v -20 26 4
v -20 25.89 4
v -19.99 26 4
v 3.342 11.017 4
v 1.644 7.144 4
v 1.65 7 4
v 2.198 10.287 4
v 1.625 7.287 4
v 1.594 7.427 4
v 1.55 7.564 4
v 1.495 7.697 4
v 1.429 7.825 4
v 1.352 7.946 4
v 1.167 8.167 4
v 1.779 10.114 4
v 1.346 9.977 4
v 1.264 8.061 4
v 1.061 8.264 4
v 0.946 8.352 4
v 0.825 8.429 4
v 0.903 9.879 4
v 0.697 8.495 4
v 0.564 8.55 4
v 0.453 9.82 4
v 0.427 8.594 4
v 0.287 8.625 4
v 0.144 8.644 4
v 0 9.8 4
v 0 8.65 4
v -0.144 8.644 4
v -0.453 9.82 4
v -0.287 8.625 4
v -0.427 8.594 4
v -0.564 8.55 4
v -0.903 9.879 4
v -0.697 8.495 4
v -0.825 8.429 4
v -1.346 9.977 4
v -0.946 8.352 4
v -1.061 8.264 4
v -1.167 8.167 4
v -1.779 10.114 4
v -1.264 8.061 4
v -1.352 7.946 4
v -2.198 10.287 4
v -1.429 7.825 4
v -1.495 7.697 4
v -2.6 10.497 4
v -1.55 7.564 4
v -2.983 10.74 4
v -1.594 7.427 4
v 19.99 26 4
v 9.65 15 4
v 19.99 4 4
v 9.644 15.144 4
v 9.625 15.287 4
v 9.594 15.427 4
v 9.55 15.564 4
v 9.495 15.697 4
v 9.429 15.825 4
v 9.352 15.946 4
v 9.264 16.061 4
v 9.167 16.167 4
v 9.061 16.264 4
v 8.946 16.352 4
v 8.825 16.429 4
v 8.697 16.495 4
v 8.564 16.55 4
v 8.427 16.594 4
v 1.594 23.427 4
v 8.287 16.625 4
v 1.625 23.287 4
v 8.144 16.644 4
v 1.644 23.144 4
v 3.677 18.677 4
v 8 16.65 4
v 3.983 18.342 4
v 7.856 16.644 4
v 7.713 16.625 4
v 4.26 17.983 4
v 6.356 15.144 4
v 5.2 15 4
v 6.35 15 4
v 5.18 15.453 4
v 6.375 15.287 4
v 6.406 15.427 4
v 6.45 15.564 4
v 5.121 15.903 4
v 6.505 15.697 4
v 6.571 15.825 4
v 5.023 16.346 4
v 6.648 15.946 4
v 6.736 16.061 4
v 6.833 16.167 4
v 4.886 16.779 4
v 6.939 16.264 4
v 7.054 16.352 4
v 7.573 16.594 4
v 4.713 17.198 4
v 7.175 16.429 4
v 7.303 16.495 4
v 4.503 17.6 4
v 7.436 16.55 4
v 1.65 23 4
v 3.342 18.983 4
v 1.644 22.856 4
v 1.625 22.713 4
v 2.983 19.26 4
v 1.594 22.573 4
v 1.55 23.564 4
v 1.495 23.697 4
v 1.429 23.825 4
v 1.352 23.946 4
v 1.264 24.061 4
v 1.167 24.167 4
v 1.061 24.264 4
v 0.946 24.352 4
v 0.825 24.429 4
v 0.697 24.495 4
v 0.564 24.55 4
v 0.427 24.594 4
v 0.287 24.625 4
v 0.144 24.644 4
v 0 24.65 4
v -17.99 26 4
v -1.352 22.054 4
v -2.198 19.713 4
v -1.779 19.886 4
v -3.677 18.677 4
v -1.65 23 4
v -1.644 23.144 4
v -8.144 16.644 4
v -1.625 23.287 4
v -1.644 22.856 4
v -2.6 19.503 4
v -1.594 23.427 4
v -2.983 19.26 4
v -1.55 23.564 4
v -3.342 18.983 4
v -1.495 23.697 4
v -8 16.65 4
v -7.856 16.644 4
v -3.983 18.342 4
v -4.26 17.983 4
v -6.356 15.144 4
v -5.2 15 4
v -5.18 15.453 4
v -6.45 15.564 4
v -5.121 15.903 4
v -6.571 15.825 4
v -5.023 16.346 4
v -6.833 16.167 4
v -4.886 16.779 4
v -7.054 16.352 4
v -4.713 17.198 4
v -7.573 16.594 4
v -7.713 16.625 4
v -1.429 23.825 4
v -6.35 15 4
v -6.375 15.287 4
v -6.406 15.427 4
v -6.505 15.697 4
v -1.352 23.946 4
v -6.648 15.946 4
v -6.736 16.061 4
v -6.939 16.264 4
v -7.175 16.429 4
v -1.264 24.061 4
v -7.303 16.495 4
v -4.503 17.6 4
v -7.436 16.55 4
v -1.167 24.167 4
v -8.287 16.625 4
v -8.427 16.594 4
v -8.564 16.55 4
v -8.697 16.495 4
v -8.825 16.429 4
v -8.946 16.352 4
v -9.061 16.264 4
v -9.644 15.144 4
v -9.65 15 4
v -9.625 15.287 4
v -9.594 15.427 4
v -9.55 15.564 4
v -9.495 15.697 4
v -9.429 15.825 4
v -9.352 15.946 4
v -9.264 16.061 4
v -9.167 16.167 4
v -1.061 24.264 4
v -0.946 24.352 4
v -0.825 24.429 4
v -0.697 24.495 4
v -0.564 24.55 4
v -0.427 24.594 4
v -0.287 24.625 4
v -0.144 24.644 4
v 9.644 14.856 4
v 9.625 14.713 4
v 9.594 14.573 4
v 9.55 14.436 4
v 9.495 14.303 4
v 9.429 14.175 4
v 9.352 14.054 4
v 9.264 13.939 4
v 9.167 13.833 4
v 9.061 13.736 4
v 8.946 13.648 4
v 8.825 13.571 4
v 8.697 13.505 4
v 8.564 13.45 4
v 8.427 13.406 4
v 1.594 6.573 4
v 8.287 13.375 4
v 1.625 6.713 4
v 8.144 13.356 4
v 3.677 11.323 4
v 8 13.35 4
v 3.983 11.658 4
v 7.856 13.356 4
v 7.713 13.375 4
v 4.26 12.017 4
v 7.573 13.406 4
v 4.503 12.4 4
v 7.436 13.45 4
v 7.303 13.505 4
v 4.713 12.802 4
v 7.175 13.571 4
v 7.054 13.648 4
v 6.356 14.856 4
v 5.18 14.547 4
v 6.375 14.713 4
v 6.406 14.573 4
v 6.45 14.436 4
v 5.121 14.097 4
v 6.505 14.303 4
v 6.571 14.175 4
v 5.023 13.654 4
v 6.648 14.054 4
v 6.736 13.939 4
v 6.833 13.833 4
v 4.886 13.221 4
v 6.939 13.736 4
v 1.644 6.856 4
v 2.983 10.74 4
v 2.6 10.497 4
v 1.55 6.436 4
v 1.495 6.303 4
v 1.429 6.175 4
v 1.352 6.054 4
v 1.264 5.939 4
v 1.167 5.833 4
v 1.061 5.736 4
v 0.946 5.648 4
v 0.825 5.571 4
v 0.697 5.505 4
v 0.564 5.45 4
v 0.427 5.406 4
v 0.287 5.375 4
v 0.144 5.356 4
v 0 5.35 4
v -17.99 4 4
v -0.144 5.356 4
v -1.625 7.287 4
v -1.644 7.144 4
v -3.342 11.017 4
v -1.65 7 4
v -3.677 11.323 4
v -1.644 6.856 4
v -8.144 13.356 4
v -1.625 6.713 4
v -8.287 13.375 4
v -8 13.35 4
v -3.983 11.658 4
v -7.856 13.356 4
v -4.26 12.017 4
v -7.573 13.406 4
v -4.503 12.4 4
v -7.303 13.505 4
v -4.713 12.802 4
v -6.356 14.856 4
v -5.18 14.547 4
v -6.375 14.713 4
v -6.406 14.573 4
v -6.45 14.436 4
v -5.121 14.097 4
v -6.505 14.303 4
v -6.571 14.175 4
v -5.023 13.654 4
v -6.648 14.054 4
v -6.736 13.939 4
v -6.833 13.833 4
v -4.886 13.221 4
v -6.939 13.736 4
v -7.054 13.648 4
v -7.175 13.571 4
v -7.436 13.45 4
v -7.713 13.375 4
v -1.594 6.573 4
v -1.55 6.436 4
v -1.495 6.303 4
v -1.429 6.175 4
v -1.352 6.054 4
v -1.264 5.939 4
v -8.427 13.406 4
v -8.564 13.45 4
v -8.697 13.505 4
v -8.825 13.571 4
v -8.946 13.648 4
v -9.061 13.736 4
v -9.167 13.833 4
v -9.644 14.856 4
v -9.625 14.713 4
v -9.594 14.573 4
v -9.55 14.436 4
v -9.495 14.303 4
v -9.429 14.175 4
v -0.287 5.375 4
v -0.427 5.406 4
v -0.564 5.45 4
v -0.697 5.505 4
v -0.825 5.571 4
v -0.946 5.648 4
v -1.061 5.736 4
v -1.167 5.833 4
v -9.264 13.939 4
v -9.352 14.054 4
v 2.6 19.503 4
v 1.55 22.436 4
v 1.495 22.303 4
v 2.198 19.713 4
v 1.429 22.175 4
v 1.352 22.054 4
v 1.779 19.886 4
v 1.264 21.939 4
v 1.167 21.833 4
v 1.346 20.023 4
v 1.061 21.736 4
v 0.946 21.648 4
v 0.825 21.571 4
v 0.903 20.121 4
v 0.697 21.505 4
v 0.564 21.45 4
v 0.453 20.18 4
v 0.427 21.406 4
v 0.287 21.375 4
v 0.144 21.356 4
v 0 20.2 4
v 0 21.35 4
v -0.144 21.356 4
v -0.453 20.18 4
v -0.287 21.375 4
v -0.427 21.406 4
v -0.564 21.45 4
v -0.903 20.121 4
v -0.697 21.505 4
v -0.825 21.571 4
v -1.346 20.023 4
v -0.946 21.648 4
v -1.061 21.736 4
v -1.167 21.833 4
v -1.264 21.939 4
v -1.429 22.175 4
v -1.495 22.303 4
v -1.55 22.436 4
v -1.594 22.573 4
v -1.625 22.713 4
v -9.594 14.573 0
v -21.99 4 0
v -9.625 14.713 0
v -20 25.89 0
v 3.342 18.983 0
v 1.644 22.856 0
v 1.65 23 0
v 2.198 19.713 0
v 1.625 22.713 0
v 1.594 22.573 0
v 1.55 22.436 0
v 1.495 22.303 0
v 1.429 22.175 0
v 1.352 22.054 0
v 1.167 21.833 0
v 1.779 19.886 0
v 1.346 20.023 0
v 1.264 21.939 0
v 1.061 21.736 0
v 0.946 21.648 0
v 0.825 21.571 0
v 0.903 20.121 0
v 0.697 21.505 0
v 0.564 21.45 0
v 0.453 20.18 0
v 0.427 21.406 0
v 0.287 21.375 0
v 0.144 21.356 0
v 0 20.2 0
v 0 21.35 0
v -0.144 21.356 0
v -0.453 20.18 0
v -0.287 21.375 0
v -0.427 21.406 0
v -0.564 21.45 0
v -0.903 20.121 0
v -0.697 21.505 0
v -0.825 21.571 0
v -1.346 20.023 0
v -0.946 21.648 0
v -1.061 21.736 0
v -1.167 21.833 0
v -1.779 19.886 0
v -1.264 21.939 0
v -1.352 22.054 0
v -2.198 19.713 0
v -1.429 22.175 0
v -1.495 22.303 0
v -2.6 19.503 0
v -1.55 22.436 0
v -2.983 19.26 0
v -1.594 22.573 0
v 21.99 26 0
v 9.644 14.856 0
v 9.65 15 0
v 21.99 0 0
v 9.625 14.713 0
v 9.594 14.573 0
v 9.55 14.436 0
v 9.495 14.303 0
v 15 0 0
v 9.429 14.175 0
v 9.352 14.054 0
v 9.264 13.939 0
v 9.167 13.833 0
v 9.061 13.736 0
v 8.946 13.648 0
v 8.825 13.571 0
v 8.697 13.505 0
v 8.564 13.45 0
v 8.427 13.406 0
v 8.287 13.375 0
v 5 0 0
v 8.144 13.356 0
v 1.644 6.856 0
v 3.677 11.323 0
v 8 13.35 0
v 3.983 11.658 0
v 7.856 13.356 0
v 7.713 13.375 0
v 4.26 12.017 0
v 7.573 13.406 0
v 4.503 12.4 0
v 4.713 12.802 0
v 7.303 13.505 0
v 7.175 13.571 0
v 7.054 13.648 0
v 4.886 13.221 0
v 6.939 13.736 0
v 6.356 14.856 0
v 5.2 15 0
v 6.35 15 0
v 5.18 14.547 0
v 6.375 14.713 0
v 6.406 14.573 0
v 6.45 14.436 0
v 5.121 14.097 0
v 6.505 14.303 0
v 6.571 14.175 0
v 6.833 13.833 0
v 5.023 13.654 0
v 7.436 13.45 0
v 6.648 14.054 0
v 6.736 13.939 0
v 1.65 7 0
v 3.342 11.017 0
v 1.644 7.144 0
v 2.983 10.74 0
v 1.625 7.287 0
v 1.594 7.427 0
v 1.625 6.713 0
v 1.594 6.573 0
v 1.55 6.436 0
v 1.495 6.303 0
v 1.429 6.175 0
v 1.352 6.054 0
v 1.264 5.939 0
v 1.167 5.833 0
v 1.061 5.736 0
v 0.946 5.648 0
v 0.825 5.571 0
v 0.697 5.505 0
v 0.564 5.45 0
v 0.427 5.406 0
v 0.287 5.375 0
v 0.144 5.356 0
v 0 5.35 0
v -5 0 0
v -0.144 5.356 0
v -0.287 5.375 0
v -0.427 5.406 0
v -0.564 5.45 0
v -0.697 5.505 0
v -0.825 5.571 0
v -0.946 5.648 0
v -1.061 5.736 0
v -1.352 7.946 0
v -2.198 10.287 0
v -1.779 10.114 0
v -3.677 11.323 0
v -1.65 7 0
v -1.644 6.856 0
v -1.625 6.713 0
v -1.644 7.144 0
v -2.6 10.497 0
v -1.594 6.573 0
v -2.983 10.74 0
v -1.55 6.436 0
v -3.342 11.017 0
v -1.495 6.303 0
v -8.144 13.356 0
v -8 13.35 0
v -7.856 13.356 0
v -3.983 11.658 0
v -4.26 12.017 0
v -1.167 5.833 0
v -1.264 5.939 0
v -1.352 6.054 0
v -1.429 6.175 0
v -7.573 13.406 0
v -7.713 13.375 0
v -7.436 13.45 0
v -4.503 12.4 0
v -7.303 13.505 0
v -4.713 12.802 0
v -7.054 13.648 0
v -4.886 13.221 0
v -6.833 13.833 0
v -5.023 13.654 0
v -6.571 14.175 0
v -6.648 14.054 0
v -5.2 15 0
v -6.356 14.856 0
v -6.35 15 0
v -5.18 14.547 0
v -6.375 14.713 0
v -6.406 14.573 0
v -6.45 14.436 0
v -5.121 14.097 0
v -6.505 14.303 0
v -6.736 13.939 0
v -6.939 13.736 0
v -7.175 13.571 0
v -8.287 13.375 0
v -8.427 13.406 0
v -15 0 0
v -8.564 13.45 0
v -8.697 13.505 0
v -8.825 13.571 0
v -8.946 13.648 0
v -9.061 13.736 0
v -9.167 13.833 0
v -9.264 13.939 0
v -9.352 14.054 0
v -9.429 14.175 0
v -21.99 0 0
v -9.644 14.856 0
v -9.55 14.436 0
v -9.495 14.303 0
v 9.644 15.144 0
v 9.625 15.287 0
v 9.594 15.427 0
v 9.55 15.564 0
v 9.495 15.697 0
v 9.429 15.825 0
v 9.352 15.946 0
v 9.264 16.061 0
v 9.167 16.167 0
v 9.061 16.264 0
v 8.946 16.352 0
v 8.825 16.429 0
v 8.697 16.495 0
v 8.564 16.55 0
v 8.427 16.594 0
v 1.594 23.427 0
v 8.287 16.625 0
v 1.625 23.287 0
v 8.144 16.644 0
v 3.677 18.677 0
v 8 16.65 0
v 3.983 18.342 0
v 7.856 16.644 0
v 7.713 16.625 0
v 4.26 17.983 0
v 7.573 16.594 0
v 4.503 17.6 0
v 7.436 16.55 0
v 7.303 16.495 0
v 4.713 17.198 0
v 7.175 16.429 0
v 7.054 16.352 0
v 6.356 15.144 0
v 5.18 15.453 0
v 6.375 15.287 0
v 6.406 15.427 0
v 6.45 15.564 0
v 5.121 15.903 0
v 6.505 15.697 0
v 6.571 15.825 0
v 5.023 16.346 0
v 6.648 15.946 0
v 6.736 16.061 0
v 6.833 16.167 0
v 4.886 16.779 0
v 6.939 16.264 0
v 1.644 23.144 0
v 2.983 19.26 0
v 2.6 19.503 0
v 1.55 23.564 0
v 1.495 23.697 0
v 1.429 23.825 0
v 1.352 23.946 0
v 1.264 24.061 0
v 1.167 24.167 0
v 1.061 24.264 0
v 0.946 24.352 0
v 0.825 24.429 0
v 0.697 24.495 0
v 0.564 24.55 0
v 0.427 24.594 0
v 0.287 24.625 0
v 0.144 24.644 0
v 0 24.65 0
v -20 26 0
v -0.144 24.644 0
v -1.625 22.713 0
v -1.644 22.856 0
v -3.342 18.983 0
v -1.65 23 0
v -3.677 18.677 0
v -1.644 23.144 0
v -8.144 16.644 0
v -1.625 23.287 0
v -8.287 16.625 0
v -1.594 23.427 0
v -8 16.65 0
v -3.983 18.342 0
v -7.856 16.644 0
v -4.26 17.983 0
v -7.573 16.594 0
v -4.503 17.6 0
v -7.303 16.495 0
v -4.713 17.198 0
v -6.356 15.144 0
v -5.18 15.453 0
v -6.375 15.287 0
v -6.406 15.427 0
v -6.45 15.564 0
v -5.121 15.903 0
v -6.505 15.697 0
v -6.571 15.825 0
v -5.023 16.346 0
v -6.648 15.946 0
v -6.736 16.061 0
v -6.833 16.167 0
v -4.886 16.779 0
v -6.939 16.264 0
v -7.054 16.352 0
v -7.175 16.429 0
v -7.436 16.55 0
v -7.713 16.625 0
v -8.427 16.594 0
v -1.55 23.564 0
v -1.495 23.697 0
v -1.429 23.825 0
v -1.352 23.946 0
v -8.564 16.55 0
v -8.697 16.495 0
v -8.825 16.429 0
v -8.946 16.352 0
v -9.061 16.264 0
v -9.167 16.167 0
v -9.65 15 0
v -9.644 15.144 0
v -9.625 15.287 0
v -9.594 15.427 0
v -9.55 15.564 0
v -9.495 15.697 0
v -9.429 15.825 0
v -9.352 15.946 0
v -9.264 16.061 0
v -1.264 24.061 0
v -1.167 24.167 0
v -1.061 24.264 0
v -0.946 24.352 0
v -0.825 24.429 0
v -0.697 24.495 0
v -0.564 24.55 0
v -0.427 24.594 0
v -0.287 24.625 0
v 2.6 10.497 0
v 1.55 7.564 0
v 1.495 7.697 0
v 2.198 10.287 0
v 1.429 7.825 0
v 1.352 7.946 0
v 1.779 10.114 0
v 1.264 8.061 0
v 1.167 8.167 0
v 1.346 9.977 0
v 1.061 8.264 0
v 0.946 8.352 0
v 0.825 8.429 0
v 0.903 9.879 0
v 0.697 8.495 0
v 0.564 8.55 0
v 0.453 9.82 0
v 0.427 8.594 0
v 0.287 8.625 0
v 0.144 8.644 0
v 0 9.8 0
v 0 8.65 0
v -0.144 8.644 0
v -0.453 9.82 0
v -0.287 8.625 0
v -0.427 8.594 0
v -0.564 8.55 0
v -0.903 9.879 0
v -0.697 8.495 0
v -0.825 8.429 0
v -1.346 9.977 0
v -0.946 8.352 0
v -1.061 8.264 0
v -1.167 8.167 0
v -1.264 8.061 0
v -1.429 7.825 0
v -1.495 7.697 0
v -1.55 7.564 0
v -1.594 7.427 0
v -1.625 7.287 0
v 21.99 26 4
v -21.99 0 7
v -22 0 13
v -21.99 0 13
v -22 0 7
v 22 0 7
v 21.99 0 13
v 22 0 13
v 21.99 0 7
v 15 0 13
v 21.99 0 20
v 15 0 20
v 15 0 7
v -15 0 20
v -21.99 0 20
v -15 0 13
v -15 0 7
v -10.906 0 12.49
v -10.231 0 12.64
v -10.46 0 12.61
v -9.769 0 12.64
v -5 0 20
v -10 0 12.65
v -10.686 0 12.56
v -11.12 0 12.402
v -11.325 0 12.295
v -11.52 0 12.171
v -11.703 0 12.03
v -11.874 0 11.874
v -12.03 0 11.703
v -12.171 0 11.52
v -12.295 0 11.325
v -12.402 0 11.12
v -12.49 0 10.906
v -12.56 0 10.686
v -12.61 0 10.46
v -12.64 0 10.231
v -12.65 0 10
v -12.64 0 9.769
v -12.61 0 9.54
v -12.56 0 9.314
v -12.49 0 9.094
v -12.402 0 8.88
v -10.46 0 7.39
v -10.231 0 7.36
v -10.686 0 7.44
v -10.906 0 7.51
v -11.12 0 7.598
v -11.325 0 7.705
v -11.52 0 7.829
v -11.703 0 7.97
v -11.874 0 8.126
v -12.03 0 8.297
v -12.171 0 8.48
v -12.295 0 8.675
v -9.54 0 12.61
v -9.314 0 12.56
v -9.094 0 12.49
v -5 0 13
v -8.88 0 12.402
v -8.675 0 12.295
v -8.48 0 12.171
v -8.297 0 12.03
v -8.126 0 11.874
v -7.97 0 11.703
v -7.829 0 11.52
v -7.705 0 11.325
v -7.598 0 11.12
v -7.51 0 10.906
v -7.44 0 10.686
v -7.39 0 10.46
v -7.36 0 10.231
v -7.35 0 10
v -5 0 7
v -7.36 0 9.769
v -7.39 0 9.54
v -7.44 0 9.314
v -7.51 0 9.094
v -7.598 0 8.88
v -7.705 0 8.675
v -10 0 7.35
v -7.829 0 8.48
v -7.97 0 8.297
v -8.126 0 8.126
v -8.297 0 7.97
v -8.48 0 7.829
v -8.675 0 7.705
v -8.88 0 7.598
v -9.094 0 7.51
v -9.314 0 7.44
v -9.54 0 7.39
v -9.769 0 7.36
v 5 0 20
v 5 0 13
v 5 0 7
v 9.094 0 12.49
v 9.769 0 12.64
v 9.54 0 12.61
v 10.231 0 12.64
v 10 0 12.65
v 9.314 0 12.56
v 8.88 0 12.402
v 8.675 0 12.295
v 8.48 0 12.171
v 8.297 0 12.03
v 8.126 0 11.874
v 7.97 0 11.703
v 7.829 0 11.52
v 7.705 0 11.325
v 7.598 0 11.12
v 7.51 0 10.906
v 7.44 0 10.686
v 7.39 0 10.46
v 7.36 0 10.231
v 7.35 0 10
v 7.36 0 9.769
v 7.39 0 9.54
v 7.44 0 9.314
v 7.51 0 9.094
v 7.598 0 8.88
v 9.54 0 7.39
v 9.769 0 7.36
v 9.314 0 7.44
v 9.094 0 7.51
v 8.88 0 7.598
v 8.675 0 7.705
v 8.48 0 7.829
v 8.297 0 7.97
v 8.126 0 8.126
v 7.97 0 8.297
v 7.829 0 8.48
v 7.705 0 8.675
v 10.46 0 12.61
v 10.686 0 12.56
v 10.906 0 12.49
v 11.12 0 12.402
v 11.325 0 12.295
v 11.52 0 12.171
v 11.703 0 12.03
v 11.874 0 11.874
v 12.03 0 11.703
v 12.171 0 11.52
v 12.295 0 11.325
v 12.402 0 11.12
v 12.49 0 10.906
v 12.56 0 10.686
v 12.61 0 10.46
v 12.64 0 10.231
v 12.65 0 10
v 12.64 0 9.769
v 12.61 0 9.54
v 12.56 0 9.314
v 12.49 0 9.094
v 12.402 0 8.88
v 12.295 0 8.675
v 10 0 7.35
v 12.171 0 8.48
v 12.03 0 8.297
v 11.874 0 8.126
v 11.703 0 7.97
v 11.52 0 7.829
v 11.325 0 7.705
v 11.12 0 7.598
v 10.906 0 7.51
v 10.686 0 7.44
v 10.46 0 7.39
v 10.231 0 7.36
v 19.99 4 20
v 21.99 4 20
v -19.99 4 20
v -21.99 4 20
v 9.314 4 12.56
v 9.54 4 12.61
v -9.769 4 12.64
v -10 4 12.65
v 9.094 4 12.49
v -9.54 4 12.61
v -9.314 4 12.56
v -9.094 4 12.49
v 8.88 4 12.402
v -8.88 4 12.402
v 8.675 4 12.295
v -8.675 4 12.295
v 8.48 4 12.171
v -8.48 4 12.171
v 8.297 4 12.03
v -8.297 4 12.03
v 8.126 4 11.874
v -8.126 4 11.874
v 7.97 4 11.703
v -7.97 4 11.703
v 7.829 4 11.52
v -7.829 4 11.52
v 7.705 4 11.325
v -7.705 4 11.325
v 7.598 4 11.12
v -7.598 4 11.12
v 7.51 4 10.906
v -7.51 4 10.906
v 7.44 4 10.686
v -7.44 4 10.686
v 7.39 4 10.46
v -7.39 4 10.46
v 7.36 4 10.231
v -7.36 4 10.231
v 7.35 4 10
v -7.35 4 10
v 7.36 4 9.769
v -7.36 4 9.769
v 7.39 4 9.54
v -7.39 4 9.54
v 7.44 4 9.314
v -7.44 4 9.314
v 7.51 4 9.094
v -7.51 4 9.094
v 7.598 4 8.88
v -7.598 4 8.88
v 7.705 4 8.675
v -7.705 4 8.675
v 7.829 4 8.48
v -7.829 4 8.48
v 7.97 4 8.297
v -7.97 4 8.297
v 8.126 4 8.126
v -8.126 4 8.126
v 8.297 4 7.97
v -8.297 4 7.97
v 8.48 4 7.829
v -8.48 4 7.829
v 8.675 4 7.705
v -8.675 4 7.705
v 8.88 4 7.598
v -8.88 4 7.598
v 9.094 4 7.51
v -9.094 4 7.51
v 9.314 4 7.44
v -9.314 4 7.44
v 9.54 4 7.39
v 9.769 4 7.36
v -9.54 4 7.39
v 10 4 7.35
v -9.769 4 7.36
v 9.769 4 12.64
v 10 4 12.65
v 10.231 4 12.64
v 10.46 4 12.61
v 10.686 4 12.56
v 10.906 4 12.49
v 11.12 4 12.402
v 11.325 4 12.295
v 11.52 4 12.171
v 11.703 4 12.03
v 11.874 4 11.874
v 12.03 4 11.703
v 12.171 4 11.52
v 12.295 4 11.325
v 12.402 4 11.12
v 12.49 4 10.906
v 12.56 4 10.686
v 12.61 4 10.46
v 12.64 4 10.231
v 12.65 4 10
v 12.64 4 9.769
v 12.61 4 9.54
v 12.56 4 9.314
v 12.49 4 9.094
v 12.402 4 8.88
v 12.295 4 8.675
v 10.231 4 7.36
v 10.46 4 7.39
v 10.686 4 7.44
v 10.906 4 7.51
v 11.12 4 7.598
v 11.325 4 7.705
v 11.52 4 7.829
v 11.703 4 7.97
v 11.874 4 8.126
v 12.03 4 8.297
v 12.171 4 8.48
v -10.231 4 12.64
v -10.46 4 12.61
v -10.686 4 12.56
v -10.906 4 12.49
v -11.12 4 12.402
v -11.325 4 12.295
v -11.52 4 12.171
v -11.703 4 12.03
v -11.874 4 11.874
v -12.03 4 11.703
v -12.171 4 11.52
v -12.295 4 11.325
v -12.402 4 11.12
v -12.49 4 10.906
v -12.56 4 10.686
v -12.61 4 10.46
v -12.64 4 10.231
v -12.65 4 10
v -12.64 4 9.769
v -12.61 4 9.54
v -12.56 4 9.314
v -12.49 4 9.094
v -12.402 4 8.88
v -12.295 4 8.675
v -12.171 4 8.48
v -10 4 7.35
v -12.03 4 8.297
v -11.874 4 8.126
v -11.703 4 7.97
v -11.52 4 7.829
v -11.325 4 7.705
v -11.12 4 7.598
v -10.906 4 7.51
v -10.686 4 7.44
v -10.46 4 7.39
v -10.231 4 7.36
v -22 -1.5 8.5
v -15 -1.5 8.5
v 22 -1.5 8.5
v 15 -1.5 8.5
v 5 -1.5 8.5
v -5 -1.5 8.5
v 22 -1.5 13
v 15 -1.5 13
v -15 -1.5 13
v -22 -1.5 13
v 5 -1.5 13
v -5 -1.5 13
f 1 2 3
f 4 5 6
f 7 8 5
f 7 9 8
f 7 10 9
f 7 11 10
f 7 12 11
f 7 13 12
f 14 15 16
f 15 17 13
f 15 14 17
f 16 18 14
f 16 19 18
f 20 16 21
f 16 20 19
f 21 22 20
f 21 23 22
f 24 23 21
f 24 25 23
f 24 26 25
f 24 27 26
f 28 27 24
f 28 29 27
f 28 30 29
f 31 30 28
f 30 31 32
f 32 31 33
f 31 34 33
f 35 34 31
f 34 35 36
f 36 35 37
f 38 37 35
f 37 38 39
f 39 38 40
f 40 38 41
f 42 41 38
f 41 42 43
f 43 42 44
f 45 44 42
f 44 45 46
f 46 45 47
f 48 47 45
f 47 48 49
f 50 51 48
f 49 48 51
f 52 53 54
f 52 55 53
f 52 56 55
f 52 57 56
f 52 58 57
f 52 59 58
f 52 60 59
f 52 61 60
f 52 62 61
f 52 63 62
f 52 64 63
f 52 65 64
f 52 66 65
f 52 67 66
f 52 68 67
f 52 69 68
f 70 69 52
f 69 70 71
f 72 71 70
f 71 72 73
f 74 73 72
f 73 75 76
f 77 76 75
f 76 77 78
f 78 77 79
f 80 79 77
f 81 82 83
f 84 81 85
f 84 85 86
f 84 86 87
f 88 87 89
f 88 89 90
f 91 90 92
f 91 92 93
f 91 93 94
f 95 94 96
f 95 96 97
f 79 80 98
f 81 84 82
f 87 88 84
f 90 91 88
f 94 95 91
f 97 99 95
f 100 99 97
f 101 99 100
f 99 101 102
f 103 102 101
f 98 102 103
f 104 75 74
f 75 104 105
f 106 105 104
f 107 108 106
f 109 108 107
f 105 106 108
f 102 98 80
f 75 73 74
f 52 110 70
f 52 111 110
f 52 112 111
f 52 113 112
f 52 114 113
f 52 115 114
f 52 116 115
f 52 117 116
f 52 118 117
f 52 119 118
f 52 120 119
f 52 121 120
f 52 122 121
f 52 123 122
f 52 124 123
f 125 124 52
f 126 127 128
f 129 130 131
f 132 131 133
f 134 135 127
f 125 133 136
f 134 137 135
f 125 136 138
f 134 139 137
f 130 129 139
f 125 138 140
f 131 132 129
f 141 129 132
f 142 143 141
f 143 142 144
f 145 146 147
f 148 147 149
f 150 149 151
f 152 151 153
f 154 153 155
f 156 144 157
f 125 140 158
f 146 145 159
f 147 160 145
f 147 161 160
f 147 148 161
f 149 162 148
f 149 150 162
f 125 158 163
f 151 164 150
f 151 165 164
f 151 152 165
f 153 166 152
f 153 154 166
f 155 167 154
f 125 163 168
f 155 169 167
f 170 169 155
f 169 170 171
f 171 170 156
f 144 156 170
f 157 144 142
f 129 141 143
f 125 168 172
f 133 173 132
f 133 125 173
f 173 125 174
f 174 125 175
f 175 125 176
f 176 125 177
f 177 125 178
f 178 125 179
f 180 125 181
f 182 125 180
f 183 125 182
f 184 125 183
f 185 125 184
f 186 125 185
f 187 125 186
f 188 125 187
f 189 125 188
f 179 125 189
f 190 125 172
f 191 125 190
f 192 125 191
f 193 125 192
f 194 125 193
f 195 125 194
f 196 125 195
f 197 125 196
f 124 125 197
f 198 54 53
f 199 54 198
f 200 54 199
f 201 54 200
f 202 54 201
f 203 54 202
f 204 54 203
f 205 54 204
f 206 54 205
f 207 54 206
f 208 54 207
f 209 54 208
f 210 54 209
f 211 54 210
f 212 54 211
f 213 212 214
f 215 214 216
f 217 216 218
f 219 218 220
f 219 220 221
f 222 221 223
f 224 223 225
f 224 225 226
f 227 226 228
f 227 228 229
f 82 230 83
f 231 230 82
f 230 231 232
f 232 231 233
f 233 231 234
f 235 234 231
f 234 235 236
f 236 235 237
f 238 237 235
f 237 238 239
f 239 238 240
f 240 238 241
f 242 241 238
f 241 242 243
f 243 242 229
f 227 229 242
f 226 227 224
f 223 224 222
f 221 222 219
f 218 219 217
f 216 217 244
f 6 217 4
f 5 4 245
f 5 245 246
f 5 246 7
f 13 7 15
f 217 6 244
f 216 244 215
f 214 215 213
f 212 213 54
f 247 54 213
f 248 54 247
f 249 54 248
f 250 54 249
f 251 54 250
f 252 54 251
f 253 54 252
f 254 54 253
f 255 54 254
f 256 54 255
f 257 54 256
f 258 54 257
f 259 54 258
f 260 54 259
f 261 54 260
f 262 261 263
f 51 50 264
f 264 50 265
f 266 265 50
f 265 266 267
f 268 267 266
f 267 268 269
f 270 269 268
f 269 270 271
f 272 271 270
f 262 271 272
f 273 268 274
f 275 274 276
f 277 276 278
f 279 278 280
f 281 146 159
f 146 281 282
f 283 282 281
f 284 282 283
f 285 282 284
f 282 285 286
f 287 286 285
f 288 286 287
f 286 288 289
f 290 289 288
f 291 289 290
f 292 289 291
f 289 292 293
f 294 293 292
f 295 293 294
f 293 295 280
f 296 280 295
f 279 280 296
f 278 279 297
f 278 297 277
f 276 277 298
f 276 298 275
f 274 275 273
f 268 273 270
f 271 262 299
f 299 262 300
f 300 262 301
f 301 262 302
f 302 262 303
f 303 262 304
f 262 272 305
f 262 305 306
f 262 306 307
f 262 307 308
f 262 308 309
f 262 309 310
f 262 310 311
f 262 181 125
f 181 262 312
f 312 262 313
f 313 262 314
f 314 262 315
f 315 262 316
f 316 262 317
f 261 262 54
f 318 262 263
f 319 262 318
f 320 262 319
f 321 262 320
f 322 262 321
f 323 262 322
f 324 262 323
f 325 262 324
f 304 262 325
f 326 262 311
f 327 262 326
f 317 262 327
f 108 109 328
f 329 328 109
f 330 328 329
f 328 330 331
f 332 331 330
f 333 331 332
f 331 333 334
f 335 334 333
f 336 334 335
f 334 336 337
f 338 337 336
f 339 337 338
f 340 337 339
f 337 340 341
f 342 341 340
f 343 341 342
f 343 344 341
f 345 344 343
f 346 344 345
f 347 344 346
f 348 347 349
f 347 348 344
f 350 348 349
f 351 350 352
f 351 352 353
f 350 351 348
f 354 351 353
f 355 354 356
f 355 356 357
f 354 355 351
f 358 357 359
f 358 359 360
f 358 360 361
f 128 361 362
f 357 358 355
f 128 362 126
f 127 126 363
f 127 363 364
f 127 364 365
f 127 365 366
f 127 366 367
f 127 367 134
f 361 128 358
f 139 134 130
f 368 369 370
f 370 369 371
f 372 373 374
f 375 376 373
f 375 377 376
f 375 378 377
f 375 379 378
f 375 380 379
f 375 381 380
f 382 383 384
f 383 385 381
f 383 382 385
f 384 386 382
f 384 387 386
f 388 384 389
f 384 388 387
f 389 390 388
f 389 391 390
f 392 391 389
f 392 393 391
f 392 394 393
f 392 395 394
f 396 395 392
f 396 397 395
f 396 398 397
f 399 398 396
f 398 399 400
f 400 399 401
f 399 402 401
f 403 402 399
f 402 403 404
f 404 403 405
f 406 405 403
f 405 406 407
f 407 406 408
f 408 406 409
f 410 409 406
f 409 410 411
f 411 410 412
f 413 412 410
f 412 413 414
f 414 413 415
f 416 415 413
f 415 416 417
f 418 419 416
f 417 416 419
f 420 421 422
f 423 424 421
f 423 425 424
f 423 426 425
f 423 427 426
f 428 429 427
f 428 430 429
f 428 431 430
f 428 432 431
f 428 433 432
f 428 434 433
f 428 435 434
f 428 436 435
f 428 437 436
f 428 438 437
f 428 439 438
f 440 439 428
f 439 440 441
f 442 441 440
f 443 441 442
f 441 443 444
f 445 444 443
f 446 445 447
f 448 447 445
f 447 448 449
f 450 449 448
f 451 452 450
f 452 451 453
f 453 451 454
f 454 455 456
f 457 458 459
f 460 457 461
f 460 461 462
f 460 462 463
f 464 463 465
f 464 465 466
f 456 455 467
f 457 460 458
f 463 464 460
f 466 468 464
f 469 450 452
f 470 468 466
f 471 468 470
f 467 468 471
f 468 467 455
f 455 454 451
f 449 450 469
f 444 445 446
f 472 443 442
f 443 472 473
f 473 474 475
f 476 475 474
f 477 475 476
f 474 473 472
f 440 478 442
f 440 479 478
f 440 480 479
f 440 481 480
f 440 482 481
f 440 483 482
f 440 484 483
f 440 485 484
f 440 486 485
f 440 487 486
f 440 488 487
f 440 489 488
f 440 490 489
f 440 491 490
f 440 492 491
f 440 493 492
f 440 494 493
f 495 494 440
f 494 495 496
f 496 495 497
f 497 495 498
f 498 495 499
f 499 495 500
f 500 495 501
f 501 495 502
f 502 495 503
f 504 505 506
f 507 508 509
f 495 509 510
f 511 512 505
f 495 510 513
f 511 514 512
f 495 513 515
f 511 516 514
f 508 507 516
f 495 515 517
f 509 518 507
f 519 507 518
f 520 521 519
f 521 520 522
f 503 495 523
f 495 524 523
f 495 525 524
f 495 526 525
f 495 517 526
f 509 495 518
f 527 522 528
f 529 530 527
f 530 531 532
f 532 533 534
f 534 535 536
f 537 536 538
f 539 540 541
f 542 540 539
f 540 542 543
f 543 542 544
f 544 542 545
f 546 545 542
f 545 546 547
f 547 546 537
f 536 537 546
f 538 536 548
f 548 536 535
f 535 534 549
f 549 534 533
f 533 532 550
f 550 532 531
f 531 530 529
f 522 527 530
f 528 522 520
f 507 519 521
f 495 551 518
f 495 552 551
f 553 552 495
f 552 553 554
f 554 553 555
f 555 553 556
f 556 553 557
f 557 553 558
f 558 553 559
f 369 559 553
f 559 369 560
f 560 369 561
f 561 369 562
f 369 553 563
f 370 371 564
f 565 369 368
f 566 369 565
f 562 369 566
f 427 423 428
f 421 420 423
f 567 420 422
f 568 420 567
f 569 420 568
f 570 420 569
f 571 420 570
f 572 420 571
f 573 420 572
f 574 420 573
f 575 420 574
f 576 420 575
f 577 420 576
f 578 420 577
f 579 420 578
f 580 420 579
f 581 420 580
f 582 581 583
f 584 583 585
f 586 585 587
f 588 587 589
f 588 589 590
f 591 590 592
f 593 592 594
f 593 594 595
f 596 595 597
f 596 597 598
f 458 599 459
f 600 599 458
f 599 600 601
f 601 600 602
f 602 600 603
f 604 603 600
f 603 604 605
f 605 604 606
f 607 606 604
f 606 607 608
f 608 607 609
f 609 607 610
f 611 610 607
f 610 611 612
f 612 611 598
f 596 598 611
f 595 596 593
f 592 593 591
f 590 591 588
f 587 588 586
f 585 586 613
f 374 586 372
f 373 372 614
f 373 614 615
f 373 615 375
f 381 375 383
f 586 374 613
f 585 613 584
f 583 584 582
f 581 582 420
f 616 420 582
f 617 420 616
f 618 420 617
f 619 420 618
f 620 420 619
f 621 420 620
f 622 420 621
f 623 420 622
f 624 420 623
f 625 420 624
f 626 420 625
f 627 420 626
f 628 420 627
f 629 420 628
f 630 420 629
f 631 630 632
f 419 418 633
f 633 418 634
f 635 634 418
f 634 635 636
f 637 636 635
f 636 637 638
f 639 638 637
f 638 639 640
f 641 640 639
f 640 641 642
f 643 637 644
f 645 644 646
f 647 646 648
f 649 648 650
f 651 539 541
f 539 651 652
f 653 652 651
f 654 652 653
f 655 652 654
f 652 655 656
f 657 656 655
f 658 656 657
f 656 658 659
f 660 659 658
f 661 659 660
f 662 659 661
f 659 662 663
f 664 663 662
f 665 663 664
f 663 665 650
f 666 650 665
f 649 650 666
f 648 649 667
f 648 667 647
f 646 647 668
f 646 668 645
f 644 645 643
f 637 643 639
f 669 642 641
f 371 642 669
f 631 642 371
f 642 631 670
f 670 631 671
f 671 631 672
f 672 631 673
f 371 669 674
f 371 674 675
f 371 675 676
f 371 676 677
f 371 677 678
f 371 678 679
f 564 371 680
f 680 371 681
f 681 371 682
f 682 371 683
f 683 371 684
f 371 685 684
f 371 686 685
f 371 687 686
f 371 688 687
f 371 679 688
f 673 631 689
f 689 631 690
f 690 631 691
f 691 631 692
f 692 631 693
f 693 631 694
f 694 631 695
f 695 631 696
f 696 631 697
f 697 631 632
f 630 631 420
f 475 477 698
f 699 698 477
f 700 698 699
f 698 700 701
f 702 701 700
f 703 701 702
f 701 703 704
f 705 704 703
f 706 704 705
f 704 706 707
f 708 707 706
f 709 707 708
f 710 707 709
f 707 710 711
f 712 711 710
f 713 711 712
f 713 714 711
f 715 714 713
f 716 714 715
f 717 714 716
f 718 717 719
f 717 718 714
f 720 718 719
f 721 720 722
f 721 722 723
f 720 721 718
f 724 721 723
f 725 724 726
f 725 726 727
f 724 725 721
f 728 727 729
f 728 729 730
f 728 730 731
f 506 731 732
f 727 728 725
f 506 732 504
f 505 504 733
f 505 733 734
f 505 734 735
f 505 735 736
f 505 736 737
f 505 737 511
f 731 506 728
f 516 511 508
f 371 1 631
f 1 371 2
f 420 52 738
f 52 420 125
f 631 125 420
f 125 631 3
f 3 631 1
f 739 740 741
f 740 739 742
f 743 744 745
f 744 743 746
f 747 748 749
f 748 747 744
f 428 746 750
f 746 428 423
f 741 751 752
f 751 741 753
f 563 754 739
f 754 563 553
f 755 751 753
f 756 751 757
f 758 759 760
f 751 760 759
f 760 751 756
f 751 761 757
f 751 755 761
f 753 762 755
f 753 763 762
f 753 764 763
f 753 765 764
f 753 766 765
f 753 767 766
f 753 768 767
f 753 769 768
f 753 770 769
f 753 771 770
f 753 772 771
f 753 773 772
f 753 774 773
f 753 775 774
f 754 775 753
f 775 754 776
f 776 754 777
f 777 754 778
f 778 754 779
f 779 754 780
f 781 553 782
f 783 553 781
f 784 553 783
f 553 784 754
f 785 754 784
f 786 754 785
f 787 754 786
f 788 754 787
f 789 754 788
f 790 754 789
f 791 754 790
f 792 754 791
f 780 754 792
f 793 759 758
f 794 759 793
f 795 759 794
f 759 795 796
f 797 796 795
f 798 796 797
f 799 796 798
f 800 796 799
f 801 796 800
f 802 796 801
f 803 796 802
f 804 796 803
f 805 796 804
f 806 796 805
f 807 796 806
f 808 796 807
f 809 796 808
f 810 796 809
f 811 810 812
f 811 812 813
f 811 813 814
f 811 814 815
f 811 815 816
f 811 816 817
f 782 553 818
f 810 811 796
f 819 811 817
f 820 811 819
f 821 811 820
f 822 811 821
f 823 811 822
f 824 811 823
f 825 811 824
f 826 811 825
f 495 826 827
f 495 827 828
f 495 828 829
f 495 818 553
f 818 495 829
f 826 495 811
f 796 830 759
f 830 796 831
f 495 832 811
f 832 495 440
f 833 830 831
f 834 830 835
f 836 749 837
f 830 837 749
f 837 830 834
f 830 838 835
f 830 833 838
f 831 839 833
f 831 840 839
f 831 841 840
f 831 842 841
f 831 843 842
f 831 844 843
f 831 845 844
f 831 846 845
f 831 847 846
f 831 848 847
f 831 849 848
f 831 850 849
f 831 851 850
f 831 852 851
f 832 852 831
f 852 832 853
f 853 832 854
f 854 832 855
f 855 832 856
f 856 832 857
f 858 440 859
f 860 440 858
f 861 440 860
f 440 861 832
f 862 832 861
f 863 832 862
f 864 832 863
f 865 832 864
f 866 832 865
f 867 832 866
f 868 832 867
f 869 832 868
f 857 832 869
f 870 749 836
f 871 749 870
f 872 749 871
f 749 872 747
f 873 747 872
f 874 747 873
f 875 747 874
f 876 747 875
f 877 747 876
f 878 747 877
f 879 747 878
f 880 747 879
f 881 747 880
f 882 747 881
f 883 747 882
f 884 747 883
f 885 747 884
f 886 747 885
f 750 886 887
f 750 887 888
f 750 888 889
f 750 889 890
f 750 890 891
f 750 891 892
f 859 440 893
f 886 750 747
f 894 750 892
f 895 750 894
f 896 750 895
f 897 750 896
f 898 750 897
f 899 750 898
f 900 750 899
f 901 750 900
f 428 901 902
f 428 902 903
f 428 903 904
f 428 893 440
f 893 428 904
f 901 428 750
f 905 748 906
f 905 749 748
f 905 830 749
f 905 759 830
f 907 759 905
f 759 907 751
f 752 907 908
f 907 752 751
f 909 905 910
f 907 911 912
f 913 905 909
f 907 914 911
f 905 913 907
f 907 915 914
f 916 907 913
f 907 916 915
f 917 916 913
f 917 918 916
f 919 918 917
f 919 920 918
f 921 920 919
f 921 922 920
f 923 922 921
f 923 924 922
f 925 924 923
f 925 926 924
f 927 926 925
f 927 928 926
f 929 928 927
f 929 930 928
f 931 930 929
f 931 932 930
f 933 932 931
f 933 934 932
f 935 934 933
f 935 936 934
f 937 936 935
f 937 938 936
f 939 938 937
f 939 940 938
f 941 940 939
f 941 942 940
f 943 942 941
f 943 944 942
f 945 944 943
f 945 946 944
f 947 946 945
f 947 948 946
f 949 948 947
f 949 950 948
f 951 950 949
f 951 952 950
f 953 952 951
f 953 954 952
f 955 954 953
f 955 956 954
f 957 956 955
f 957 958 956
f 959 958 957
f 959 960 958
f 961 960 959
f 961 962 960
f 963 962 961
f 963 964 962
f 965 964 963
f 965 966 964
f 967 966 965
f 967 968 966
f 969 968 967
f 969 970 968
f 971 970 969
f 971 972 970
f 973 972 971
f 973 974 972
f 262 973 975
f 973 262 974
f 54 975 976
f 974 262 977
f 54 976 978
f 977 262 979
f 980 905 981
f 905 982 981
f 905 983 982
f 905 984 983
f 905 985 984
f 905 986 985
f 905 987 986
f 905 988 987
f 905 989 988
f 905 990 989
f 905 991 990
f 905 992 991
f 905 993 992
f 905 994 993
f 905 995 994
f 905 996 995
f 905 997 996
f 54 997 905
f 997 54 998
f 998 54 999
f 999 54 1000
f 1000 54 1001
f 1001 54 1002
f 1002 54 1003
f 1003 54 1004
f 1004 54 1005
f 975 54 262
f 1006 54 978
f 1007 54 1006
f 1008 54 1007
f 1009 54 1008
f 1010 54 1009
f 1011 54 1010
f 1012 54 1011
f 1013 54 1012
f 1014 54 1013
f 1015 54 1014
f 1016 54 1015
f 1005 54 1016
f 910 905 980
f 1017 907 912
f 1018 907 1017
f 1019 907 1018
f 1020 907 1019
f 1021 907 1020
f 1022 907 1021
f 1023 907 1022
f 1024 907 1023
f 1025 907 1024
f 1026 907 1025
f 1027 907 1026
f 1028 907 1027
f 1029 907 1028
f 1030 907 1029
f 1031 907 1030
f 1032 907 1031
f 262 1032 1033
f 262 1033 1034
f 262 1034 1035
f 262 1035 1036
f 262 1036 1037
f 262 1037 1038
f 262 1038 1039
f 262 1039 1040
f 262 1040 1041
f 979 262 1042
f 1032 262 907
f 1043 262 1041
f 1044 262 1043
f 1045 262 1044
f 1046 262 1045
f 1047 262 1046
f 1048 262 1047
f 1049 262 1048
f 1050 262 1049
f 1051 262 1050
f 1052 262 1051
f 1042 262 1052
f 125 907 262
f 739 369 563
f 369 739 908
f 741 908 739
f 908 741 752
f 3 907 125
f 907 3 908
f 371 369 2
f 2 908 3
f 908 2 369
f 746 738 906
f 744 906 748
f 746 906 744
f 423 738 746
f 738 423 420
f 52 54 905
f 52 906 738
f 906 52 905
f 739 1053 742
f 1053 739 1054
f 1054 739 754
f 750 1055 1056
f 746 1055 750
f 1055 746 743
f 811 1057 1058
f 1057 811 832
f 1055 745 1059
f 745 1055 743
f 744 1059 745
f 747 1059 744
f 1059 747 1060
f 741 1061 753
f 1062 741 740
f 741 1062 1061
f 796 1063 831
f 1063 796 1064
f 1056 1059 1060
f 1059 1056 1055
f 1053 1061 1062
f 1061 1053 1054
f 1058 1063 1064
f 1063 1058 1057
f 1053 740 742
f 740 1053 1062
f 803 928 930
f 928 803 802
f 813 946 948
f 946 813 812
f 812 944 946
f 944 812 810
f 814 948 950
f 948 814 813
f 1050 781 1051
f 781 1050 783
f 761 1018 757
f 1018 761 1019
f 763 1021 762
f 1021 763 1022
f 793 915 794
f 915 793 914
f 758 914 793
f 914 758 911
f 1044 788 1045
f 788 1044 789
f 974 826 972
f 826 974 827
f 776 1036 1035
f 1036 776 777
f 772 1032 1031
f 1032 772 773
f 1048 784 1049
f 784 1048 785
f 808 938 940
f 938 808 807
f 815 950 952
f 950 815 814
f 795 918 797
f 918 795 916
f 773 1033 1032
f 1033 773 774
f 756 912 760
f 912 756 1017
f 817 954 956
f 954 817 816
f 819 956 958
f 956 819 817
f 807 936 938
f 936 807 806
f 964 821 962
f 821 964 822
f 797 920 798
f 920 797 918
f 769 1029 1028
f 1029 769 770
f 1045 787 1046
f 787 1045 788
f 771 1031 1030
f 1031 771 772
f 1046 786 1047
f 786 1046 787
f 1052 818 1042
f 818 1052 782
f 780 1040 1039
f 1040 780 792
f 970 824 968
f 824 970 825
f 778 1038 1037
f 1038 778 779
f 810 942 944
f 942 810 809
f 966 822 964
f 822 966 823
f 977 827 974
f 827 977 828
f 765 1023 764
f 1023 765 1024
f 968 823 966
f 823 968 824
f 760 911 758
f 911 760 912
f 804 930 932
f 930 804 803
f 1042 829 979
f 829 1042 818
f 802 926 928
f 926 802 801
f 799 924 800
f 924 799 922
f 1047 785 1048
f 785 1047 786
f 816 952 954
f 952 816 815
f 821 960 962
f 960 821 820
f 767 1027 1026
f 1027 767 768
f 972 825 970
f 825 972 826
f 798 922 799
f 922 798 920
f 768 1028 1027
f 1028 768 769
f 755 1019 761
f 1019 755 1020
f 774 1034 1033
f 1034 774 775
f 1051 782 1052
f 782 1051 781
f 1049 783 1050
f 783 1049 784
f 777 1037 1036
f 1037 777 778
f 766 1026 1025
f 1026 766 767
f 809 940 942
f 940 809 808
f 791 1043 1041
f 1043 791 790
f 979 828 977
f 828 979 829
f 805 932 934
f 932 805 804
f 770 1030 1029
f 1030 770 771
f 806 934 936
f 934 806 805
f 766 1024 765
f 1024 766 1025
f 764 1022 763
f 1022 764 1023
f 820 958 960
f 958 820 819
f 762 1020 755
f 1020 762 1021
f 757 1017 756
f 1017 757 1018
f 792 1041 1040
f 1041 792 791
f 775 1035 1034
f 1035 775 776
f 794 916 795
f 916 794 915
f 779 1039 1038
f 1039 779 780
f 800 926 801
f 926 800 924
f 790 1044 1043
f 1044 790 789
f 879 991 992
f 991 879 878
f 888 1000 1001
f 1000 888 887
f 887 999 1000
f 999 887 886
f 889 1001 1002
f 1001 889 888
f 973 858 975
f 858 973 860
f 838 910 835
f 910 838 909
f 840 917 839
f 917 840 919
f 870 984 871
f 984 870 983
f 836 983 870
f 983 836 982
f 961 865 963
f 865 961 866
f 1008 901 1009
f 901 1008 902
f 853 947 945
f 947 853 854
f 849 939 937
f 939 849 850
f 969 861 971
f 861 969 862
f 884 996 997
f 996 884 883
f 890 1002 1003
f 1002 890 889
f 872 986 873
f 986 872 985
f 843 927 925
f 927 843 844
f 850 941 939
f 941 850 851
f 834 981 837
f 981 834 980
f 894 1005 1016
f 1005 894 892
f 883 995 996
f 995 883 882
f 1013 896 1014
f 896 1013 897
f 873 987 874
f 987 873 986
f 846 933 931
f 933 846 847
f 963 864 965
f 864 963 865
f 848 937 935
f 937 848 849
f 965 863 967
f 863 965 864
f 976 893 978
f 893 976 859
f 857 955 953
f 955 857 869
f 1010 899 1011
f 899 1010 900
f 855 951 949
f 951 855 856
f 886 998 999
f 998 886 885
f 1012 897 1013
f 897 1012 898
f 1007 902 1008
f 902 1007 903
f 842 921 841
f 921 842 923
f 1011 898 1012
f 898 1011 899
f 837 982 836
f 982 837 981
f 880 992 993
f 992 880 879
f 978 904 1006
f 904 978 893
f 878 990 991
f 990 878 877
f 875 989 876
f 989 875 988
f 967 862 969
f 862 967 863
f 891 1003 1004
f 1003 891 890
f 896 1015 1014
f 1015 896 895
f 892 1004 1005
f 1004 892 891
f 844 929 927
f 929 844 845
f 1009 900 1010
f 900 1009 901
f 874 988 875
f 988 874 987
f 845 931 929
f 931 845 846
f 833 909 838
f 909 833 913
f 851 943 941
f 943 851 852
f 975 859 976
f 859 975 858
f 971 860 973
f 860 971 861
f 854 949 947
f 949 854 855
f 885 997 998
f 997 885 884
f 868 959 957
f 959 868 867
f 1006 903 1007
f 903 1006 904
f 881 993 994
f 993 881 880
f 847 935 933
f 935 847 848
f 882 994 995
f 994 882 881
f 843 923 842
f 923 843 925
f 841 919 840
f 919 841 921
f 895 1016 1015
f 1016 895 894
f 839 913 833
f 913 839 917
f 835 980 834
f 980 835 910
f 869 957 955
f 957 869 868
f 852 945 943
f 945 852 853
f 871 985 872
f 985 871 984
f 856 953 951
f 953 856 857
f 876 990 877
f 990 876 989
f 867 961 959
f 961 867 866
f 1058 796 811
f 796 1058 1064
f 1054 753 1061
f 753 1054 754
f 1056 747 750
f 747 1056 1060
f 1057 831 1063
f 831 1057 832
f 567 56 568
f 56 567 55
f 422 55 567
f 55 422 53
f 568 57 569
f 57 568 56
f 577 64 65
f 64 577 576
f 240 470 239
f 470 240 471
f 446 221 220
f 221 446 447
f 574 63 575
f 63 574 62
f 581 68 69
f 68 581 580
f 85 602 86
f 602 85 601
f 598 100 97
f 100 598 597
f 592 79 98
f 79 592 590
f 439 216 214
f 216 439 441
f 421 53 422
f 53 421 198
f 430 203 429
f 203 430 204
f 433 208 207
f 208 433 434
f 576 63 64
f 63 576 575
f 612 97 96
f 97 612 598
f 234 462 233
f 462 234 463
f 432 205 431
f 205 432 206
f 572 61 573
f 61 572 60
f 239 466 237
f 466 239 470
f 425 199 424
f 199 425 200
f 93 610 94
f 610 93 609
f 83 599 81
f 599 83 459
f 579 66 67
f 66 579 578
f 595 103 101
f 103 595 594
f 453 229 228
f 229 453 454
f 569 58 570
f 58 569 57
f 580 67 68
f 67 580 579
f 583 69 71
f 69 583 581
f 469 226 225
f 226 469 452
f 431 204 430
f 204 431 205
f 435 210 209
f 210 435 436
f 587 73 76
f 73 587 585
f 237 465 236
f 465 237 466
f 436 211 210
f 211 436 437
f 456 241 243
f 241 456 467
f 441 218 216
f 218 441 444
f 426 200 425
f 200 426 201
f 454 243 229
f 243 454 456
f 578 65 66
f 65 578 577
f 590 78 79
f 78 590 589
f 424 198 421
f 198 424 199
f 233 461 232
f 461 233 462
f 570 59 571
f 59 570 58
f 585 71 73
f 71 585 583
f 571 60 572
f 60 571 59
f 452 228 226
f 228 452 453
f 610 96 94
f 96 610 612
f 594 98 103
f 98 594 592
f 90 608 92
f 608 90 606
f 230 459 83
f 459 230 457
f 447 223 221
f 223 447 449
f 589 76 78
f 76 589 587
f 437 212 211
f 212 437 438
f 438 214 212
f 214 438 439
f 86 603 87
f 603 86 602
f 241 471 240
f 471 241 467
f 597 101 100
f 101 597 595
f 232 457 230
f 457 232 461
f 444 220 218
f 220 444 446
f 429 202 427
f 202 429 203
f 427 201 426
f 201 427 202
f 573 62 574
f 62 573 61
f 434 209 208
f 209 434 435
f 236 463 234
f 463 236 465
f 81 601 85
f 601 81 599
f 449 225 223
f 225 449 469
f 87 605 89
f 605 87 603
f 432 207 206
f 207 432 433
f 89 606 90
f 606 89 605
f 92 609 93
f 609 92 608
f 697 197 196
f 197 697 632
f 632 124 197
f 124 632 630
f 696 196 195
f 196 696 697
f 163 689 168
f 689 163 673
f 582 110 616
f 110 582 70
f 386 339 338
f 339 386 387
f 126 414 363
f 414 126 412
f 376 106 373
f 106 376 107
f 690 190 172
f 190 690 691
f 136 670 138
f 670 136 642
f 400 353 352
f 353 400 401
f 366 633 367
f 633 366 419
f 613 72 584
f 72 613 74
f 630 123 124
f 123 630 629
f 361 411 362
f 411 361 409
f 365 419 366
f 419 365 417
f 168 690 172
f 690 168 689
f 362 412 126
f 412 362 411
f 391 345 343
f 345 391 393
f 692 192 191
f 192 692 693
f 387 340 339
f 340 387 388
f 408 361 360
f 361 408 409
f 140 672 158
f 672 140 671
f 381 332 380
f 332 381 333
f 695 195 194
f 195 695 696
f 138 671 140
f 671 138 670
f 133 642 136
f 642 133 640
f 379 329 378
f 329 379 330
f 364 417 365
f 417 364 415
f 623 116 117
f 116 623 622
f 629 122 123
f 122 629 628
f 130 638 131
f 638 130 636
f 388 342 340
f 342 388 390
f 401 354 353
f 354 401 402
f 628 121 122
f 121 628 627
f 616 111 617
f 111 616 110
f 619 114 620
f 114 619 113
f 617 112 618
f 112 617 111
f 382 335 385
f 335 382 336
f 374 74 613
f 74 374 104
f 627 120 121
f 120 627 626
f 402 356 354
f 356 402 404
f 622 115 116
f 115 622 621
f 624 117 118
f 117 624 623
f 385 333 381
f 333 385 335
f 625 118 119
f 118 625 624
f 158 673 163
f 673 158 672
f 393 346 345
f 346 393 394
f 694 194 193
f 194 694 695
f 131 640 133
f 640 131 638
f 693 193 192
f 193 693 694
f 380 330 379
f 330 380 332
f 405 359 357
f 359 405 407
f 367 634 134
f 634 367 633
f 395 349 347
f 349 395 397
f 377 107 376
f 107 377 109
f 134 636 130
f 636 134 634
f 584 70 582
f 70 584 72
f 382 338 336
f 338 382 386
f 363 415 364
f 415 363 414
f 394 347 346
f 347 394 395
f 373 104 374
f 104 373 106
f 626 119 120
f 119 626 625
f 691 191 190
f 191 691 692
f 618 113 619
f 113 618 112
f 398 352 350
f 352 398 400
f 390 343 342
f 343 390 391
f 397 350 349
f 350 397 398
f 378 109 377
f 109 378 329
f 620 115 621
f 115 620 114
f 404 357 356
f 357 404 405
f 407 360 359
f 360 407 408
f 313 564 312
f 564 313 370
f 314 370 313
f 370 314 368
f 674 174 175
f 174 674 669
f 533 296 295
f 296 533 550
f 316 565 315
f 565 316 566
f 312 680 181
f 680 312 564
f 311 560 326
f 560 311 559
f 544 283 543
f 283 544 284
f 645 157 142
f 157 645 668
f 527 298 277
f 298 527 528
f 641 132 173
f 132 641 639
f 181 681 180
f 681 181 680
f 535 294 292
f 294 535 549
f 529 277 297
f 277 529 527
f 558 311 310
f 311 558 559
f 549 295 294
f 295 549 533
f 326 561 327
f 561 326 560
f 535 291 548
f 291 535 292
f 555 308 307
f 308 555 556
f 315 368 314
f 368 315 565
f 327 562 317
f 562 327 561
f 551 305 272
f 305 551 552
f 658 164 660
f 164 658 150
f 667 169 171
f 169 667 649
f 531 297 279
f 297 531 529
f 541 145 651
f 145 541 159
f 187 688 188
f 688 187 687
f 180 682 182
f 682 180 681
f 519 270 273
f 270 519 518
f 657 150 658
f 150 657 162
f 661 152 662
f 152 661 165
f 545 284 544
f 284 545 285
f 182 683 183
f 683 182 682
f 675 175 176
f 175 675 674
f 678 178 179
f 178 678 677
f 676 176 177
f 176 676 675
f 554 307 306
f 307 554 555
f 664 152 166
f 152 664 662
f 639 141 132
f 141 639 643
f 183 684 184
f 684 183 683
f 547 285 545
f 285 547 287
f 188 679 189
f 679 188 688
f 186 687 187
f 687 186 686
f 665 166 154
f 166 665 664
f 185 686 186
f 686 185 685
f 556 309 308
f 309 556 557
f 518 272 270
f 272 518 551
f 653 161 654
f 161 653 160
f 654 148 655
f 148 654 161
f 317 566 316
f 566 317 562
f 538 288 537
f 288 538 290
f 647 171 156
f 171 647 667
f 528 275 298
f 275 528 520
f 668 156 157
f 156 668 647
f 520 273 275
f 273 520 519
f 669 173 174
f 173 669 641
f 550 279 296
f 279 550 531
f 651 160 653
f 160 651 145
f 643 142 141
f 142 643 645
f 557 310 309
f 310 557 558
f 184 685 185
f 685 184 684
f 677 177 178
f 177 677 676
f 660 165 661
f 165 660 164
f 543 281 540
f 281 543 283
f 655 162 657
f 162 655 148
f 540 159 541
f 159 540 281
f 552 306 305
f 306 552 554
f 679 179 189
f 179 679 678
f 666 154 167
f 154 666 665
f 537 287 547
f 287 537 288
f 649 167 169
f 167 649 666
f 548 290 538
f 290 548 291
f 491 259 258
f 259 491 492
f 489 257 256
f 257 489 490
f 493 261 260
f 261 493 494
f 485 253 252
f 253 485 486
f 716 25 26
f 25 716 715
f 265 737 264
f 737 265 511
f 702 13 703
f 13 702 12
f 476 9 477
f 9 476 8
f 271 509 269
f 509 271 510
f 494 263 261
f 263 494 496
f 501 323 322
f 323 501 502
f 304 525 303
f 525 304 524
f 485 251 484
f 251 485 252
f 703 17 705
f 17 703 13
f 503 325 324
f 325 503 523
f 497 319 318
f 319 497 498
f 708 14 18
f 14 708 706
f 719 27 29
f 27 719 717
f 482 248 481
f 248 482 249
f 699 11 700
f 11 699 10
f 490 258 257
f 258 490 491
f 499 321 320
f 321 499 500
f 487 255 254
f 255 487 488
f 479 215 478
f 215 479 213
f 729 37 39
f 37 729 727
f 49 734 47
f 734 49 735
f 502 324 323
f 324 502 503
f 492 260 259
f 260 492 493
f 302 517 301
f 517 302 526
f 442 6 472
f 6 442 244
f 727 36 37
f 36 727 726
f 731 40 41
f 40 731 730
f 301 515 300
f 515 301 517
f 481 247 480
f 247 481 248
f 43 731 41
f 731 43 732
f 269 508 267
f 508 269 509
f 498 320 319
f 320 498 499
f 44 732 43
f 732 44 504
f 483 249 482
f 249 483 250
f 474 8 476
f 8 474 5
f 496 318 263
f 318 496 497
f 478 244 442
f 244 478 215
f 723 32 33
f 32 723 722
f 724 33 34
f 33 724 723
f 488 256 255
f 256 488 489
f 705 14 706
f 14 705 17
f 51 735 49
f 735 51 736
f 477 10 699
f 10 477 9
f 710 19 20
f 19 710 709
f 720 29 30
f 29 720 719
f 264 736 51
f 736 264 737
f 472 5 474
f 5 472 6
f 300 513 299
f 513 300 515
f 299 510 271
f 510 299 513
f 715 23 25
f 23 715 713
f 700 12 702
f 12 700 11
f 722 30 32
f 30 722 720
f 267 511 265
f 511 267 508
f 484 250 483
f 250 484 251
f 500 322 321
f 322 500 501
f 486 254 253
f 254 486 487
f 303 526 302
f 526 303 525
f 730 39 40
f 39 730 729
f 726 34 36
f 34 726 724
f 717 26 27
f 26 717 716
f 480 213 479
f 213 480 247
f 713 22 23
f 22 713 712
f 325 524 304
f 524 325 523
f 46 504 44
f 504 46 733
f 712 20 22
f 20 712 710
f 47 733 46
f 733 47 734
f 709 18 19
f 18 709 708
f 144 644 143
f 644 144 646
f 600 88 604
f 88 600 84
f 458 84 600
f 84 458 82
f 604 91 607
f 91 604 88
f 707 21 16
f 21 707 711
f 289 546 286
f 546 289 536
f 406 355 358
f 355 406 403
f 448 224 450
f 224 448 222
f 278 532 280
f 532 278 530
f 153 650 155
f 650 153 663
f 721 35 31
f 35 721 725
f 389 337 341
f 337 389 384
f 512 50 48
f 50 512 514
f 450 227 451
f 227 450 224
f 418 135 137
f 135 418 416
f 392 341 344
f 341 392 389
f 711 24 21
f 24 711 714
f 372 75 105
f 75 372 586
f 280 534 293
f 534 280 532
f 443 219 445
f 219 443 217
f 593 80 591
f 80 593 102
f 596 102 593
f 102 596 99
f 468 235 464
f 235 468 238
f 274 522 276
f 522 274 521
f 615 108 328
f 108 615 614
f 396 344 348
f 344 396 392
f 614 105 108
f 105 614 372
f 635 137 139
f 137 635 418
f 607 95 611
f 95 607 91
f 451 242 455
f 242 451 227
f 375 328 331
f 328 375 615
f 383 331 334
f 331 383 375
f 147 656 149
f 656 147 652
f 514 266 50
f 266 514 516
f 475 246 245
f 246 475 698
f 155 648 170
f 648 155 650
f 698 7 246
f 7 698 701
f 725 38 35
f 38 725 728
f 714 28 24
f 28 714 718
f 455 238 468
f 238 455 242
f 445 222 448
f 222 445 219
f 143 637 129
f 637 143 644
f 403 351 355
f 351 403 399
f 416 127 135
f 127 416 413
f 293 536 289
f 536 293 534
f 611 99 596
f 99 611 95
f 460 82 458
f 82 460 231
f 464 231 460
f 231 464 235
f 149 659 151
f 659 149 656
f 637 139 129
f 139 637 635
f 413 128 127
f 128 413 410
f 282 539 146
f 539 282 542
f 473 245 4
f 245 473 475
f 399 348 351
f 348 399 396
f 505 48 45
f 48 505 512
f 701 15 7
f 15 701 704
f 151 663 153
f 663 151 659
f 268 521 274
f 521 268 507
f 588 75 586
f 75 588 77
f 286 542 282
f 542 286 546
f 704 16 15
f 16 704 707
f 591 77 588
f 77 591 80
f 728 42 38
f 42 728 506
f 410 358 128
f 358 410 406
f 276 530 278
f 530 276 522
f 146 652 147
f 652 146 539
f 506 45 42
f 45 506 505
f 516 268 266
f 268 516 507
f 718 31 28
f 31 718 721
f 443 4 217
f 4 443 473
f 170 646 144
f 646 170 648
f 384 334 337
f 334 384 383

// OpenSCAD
//3D printer z-nut bracket for 2020 extrusion
//2017, John Stäck (john@stack.se)
//Licensed under Creative Commons Attribution Share-Alike (CC BY-SA 3.0)


$fn=72;

rail_height=20; //2020 rail
slot_width=6;
notch_depth=1.5;
rail_screw_diameter=5.3; //M5 + margin

nut_diameter=22;
axle_hole = 10.4; //Just 8mm axle, but nut has 10mm collar, some margin for it.
nut_screw_diameter=3.3; //M3 + margin
nut_screw_distance=16;

slot_nut_length=10;

bracket_length=40;
bracket_width=26;
endplate_thickness=2;
bracket_thickness=4;
e=0.01;



difference() {
    union() {
        
       //Base parts of bracket
       translate([-bracket_length/2,0,0]) {
           cube([bracket_length, bracket_width, bracket_thickness]); 
           cube([bracket_length, bracket_thickness, rail_height]);

       }
       
       //Endplates
       for(i=[-1,1]) {
           translate([i*(bracket_length/2-e), 0, 0]) hull() {
               cube([endplate_thickness, bracket_width, bracket_thickness]);
               scale([i,1,1]) cube([endplate_thickness, bracket_thickness, rail_height]);
           }
       }       
       
       //Notch into rail
       notch_points=[[0,-slot_width/2],[notch_depth,-slot_width/2+notch_depth],[notch_depth,slot_width/2],[0,slot_width/2]];
       notch_path=[[0,1,2,3,0]];
       
       translate([bracket_length/2+endplate_thickness,0,rail_height/2]) rotate([90,0,-90])  linear_extrude(height=bracket_length+endplate_thickness*2) polygon(points=notch_points, paths=notch_path, convexity=2);
       
    }
    
    union() {
        //Holes for mounting bolts to rail
        for(i=[-1,1])
            translate([i*bracket_length/4, -e, rail_height/2]) rotate([-90,0,0]) cylinder(d=rail_screw_diameter, h=bracket_thickness+2*e);
        
        //Cutout in notch for slot nuts
         for(i=[-1,1])
            translate([i*bracket_length/4-slot_nut_length/2,-notch_depth-e,0]) cube([slot_nut_length,notch_depth+e,rail_height]);
        
        translate([0,bracket_width-nut_diameter/2, -e]) {
            
            //Axle hole
            cylinder(d=axle_hole, h=bracket_thickness+2*e);
            
            //Mounting screws
            for(v=[0:90:270]) {
                rotate([0,0,v]) translate([nut_screw_distance/2,0,0]) cylinder(d=nut_screw_diameter, h=bracket_thickness+2*e);
            }
        }
        
    }
}
